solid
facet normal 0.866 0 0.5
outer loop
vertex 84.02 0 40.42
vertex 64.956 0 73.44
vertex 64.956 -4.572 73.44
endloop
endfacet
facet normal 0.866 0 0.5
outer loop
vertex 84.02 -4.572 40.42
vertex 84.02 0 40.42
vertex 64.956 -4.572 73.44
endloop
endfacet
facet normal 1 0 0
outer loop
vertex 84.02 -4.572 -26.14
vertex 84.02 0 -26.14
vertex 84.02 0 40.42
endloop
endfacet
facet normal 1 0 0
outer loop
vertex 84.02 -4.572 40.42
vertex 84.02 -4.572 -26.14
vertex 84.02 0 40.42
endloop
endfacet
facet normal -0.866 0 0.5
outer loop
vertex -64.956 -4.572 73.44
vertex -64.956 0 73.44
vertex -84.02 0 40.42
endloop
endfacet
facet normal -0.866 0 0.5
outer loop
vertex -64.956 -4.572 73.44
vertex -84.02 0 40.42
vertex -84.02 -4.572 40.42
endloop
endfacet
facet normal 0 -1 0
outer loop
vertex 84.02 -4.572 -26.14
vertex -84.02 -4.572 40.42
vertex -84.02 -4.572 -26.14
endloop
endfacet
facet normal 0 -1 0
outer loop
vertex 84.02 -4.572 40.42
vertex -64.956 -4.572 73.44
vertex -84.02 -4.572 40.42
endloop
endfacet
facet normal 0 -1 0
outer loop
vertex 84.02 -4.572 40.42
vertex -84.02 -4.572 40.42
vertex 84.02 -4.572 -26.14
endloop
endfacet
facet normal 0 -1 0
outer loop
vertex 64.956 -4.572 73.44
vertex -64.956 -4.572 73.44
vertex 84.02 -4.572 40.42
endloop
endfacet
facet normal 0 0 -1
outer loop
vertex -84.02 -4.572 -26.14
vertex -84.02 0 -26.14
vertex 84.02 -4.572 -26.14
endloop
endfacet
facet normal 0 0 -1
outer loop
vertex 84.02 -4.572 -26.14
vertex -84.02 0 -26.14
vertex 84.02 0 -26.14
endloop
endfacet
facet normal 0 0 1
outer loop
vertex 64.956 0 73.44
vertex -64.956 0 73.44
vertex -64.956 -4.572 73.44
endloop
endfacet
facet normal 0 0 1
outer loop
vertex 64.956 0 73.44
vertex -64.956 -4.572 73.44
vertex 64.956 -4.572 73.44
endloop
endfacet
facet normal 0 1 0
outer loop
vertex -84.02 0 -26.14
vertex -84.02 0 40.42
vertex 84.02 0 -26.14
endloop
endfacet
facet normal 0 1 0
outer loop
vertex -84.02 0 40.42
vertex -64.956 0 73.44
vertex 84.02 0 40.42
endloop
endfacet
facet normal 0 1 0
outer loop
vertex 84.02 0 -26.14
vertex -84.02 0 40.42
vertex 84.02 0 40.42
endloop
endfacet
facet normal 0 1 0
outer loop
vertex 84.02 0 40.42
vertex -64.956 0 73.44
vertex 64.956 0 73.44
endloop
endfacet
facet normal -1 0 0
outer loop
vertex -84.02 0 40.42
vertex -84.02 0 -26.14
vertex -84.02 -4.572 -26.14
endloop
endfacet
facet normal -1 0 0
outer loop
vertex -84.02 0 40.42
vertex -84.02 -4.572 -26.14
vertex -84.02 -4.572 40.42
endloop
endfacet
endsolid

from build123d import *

# Parameters (mm, degrees)
F0_W     = 168.040336
F0_H     = 99.579409
F1_DEPTH = 4.572
F2_SIZE2 = 19.064106
F2_SIZE  = 33.02


with BuildPart() as f1:
    # F0 (on Front) → F1 (new body)
    with BuildSketch(Plane.XZ):
        with Locations((0, 23.650117)):
            Rectangle(F0_W, F0_H)
    extrude(amount=F1_DEPTH)

    # F2
    f2_edges = [f1.edges().sort_by_distance(p)[0] for p in [
        (-84.020168, -2.286, 73.439822),
        (84.020168, -2.286, 73.439822),
    ]]
    chamfer(f2_edges, length=F2_SIZE, length2=F2_SIZE2)


solid = f1.part
